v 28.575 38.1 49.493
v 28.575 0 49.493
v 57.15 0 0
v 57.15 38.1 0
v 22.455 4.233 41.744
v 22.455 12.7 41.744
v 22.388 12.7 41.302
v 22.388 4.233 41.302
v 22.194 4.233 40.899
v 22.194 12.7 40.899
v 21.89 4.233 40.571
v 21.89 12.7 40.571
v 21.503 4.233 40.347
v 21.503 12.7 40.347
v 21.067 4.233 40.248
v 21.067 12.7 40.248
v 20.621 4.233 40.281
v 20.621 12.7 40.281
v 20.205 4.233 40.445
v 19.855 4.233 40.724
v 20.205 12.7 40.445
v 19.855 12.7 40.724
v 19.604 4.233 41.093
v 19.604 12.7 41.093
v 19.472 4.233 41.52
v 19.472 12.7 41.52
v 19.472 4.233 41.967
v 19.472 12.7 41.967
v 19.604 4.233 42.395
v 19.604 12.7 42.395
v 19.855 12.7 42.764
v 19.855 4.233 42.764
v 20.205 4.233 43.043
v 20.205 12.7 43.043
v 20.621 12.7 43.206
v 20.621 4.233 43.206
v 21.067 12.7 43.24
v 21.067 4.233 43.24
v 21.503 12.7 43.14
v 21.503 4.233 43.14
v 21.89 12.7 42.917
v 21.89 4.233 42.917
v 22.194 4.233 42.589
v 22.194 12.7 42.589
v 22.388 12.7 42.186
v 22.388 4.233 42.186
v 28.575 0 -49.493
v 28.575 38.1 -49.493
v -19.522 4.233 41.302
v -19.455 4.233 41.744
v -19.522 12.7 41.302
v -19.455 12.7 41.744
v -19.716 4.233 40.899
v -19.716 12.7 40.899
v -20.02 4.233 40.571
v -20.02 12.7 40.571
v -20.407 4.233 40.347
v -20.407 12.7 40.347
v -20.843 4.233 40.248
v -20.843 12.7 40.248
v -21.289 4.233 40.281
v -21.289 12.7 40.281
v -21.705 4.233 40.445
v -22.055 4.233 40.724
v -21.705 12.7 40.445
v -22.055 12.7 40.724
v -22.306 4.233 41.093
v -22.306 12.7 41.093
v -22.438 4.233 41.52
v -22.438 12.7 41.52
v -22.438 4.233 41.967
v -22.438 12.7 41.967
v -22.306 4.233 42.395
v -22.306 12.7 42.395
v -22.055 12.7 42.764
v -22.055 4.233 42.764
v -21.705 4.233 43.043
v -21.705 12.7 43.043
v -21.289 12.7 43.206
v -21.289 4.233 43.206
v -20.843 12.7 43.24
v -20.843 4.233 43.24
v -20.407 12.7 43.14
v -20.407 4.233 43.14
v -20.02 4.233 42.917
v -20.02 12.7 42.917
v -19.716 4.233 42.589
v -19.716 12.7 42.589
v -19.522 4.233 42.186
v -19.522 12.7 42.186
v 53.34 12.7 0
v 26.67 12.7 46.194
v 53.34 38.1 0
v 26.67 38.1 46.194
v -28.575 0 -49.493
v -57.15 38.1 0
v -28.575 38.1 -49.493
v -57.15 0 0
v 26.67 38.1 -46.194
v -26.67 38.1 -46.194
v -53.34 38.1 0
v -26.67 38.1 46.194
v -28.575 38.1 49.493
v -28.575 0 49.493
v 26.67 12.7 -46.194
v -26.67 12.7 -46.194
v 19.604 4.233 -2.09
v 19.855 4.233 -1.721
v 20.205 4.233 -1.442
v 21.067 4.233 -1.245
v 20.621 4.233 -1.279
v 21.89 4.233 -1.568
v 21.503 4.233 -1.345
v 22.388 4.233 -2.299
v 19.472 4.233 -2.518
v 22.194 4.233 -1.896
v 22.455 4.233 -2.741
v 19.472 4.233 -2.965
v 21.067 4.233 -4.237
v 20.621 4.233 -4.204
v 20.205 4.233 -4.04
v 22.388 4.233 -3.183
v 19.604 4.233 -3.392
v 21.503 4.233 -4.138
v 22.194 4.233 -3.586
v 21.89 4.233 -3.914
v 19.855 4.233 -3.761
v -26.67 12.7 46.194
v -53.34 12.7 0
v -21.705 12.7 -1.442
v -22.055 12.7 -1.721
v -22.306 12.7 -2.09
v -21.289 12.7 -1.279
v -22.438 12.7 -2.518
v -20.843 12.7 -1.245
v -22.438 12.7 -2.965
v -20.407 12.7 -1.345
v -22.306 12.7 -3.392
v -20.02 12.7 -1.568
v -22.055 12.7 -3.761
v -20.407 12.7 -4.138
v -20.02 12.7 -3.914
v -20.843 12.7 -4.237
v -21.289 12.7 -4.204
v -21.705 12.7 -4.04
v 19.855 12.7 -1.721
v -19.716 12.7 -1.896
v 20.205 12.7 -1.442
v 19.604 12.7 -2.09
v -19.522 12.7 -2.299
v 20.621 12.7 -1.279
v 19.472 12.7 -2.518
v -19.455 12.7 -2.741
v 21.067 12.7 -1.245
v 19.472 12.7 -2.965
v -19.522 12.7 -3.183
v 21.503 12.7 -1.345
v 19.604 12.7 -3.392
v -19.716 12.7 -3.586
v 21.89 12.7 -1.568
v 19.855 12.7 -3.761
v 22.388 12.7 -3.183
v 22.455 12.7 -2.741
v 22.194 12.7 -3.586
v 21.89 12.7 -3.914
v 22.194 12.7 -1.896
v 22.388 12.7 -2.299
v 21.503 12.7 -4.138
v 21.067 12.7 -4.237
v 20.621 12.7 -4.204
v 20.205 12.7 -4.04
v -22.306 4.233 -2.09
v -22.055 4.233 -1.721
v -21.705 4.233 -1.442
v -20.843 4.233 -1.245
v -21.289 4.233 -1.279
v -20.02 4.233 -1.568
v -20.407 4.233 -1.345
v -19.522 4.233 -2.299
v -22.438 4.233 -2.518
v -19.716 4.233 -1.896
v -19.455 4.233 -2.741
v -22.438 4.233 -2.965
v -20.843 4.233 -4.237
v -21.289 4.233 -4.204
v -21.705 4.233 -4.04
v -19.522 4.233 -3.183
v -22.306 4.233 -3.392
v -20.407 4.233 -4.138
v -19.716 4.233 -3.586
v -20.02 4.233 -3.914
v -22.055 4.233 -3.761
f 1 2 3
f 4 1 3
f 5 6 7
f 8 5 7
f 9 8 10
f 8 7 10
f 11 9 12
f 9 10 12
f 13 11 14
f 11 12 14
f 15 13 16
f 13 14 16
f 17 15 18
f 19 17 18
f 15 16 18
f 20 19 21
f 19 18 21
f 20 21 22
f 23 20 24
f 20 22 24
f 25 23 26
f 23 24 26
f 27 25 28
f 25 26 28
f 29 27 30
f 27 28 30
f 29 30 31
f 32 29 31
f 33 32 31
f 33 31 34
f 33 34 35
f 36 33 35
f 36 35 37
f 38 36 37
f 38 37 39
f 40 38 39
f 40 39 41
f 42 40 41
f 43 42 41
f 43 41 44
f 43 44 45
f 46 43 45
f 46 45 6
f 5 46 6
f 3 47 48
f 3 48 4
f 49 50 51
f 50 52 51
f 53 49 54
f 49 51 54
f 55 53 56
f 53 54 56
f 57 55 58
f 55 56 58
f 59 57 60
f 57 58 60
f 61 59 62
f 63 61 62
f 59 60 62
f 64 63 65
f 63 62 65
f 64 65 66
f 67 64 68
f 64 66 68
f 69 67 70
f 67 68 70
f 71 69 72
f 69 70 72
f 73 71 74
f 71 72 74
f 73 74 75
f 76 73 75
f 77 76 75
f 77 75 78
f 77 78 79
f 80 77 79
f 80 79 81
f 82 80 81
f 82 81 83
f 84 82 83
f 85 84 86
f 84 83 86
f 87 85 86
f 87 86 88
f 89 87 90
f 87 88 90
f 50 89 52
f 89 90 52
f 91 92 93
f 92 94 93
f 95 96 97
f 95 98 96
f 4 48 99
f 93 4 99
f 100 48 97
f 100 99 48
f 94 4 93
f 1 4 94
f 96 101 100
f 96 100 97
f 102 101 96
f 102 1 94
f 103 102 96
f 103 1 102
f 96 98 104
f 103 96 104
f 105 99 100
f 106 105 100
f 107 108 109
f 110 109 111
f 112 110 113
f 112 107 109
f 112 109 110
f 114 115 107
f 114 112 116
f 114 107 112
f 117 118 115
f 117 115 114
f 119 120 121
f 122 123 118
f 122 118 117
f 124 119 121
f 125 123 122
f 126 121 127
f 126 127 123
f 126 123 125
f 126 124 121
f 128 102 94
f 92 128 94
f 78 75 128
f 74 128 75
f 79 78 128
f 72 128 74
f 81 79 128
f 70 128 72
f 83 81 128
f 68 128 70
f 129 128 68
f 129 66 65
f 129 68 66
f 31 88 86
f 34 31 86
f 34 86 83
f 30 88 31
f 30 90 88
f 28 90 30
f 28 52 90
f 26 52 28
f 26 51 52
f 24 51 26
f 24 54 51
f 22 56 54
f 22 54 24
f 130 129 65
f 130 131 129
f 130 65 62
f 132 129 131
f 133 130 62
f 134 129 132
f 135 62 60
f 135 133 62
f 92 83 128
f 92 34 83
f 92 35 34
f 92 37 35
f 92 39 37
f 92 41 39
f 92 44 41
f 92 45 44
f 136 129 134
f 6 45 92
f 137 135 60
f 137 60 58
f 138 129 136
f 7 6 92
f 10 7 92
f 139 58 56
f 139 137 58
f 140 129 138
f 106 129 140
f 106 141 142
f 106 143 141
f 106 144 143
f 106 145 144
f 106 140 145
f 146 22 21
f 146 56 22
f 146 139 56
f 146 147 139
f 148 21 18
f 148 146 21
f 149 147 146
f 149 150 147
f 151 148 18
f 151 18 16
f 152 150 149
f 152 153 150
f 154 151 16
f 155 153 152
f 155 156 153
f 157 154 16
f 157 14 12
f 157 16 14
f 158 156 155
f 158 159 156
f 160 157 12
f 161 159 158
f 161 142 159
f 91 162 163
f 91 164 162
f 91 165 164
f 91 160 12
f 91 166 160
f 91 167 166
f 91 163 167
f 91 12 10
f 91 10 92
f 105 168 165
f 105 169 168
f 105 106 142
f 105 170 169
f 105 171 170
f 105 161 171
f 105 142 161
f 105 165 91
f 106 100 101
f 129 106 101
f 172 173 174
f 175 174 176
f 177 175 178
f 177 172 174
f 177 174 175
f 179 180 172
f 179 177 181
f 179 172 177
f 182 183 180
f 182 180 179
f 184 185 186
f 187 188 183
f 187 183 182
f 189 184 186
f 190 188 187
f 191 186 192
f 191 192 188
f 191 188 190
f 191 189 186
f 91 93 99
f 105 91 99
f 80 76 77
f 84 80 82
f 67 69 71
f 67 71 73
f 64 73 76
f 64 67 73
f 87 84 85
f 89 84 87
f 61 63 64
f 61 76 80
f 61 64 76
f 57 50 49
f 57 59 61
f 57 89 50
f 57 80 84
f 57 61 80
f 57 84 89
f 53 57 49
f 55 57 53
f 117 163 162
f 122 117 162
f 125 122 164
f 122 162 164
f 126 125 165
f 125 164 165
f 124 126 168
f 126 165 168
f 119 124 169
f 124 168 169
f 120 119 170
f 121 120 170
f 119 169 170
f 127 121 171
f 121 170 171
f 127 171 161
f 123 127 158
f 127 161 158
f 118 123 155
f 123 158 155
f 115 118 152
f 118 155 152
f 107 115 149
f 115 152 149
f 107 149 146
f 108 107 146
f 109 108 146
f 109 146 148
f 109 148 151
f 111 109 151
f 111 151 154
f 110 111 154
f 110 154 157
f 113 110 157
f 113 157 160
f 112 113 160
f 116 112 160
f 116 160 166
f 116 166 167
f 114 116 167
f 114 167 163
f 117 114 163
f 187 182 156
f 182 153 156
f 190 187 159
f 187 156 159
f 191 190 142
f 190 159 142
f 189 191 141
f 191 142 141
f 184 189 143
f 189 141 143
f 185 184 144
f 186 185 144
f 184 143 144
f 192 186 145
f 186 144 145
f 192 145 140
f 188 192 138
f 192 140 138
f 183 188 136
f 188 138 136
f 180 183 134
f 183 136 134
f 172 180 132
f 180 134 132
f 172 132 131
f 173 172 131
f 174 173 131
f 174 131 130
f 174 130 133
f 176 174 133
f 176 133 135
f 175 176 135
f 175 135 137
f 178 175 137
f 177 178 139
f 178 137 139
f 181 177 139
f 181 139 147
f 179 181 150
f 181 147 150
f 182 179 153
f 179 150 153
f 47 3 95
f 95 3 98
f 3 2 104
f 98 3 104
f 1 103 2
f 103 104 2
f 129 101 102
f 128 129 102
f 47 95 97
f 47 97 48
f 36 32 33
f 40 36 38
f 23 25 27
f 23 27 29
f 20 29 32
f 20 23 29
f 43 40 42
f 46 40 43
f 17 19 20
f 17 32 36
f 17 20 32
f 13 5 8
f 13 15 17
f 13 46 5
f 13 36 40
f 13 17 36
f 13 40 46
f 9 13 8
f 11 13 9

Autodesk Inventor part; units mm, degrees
ref_plane "YZ Plane" through (0, 0, 0) normal (1, 0, 0) x (0, 1, 0)
ref_plane "XZ Plane" through (0, 0, 0) normal (0, 1, 0) x (-1, 0, 0)
ref_plane "XY Plane" through (0, 0, 0) normal (0, 0, 1) x (1, 0, 0)
sketch "Sketch1" plane through (0, 0, 0) normal (0, 1, 0) x (-1, 0, 0)
  line L0 (57.15, 0) -> (28.575, 49.4934)
  line L1 (28.575, 49.4934) -> (-28.575, 49.4934)
  line L2 (-28.575, 49.4934) -> (-57.15, 0)
  line L3 (57.15, 0) -> (28.575, -49.4934)
  line L4 (28.575, -49.4934) -> (-28.575, -49.4934)
  line L5 (-28.575, -49.4934) -> (-57.15, 0)
  point P0 (0, 0)
  dimension "d0" = 57.15
  dimension "d1" = 57.15
  dimension "d2" = 57.15
  dimension "d3" = 57.15
extrude "Extrusion1" add sketch "Sketch1" along normal blind 38.1
sketch "Sketch2" plane through (0, 38.1, 0) normal (0, 1, 0) x (1, 0, 0)
  line L0 (0, 0) -> (-53.34, 0)
  line L1 (-53.34, 0) -> (-26.67, -46.1938)
  line L2 (-26.67, -46.1938) -> (26.67, -46.1938)
  line L3 (26.67, -46.1938) -> (53.34, 0)
  line L4 (53.34, 0) -> (26.67, 46.1938)
  line L5 (26.67, 46.1938) -> (-26.67, 46.1938)
  line L6 (-26.67, 46.1938) -> (-53.34, 0)
  dimension "d6" = 53.34
  dimension "d7" = 53.34
  dimension "d8" = 60
  dimension "d9" = 53.34
  dimension "d10" = 53.34
extrude "Extrusion2" cut sketch "Sketch2" against normal blind 31.75
sketch "Sketch3" plane through (0, 6.35, 0) normal (0, 1, 0) x (1, 0, 0)
  line L0 (26.67, -46.1938) -> (-26.67, -46.1938) projected
  line L1 (-26.67, -46.1938) -> (26.67, -46.1938)
  line L2 (53.34, 0) -> (26.67, -46.1938) projected
  line L3 (26.67, -46.1938) -> (53.34, 0)
  line L4 (-26.67, 46.1938) -> (26.67, 46.1938) projected
  line L5 (53.34, 0) -> (26.67, 46.1938)
  line L6 (26.67, 46.1938) -> (-26.67, 46.1938)
  line L7 (-26.67, 46.1938) -> (-53.34, 0)
  line L8 (-26.67, -46.1938) -> (-53.34, 0) projected
  line L9 (-53.34, 0) -> (-26.67, -46.1938)
  line L10 (-26.67, -46.1938) -> (26.67, -46.1938)
  point P0 (0, 0)
extrude "Extrusion3" add sketch "Sketch3" along normal blind 6.35
sketch "Sketch4" plane through (0, 12.7, 0) normal (0, 1, 0) x (1, 0, 0)
  circle A0 centre (-20.955, -41.7438) radius 1.5
  line L0 (26.67, -46.1938) -> (-26.67, -46.1938) projected
  circle A1 centre (20.955, -41.7438) radius 1.5
  circle A2 centre (-20.955, 2.7412) radius 1.5
  circle A3 centre (20.955, 2.7412) radius 1.5
  point P0 (0, 0)
  dimension "d15" = 3
  dimension "d16" = 4.45
  dimension "d17" = 3
  dimension "d18" = 41.91
  dimension "d19" = 20.955
  dimension "d20" = 4.45
  dimension "d21" = 3
  dimension "d22" = 44.485
  dimension "d23" = 20.955
  dimension "d24" = 3
  dimension "d25" = 41.91
  dimension "d26" = 44.485
extrude "Extrusion4" cut sketch "Sketch4" against normal blind 8.4667
properties part number "Internal Base"
